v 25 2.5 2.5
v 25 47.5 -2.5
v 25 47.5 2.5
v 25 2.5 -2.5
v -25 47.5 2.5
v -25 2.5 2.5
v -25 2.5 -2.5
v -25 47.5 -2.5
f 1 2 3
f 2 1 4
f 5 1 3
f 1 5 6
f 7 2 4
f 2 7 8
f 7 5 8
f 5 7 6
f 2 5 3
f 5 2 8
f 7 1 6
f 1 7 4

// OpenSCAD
// L-shaped mounting bracket for NEMA 17 stepper motor
// Units: millimetres
// Orientation: Base plate on XY plane (z=0), builds upward (+Z).
// Centered on origin in X and Y.

// --- Dimensions ---
// Base Plate
base_width = 50;      // x from -25 to 25
base_depth = 45;      // y from 0 to 45
base_thickness = 5;   // z from 0 to 5

// Vertical Motor Plate
vertical_width = 50;  // x from -25 to 25
vertical_depth = 5;   // y from 0 to 5
vertical_height = 50; // z from 0 to 50

// Gussets
gusset_thickness = 5; // x thickness
gusset_leg_y = 20;    // leg along +Y
gusset_leg_z = 20;    // leg along +Z

// Holes
base_hole_diameter = 4.5; // M4
base_hole_x = 17;        // x = +/- 17
base_hole_y = 30;        // y = 30

motor_boss_hole_diameter = 23; // 23 mm hole
motor_boss_hole_x = 0;         // x = 0
motor_boss_hole_z = 28;        // z = 28

screw_hole_diameter = 3.4; // M3
screw_pattern_size = 31;   // 31 mm square pattern
screw_hole_x_offset = screw_pattern_size / 2; // 15.5
screw_hole_z_offset = screw_pattern_size / 2; // 15.5

// --- Cut Offset ---
// Constraint 5: Difference cuts must extend 0.01-1 mm past faces.
cut_offset = 0.1; 

// --- Centering ---
// Center Y offset to center the assembly on origin
y_center_offset = (base_depth + vertical_depth) / 2; // 25

// --- Main Assembly ---
translate([0, y_center_offset, 0])
difference() {
    // 1. Base Plate
    cube([base_width, base_depth, base_thickness], center = true);
    
    // 2. Vertical Motor Plate
    // Attached at back edge of base (y = base_depth)
    translate([0, base_depth, 0])
    cube([vertical_width, vertical_depth, vertical_height], center = true);
    
    // 3. Gussets
    // Left Gusset: x = -25 to -20
    translate([-gusset_thickness/2, base_depth, base_thickness])
    linear_extrude(gusset_thickness)
    polygon([
        [0, 0],
        [gusset_leg_y, 0],
        [gusset_leg_y, gusset_leg_z],
        [0, gusset_leg_z]
    ]);
    
    // Right Gusset: x = 20 to 25
    translate([gusset_thickness/2, base_depth, base_thickness])
    linear_extrude(gusset_thickness)
    polygon([
        [0, 0],
        [gusset_leg_y, 0],
        [gusset_leg_y, gusset_leg_z],
        [0, gusset_leg_z]
    ]);
    
    // 4. Base holes (M4) - two holes at y = 30
    for (i = [-1, 1]) {
        translate([i * base_hole_x, base_hole_y, 0])
        cylinder(d = base_hole_diameter + cut_offset, h = base_thickness + cut_offset, $fn = 64);
    }
    
    // 5. Motor boss hole (23mm) - through vertical plate
    translate([motor_boss_hole_x, base_depth + vertical_depth/2, motor_boss_hole_z])
    cylinder(d = motor_boss_hole_diameter + cut_offset, h = vertical_height + cut_offset, $fn = 64);
    
    // 6. M3 screw holes (4 holes on 31mm square pattern)
    for (i = [-1, 1]) {
        for (j = [-1, 1]) {
            translate([
                motor_boss_hole_x + i * screw_hole_x_offset,
                base_depth + vertical_depth/2 + j * screw_hole_z_offset,
                motor_boss_hole_z
            ])
            cylinder(d = screw_hole_diameter + cut_offset, h = vertical_height + cut_offset, $fn = 64);
        }
    }
}
